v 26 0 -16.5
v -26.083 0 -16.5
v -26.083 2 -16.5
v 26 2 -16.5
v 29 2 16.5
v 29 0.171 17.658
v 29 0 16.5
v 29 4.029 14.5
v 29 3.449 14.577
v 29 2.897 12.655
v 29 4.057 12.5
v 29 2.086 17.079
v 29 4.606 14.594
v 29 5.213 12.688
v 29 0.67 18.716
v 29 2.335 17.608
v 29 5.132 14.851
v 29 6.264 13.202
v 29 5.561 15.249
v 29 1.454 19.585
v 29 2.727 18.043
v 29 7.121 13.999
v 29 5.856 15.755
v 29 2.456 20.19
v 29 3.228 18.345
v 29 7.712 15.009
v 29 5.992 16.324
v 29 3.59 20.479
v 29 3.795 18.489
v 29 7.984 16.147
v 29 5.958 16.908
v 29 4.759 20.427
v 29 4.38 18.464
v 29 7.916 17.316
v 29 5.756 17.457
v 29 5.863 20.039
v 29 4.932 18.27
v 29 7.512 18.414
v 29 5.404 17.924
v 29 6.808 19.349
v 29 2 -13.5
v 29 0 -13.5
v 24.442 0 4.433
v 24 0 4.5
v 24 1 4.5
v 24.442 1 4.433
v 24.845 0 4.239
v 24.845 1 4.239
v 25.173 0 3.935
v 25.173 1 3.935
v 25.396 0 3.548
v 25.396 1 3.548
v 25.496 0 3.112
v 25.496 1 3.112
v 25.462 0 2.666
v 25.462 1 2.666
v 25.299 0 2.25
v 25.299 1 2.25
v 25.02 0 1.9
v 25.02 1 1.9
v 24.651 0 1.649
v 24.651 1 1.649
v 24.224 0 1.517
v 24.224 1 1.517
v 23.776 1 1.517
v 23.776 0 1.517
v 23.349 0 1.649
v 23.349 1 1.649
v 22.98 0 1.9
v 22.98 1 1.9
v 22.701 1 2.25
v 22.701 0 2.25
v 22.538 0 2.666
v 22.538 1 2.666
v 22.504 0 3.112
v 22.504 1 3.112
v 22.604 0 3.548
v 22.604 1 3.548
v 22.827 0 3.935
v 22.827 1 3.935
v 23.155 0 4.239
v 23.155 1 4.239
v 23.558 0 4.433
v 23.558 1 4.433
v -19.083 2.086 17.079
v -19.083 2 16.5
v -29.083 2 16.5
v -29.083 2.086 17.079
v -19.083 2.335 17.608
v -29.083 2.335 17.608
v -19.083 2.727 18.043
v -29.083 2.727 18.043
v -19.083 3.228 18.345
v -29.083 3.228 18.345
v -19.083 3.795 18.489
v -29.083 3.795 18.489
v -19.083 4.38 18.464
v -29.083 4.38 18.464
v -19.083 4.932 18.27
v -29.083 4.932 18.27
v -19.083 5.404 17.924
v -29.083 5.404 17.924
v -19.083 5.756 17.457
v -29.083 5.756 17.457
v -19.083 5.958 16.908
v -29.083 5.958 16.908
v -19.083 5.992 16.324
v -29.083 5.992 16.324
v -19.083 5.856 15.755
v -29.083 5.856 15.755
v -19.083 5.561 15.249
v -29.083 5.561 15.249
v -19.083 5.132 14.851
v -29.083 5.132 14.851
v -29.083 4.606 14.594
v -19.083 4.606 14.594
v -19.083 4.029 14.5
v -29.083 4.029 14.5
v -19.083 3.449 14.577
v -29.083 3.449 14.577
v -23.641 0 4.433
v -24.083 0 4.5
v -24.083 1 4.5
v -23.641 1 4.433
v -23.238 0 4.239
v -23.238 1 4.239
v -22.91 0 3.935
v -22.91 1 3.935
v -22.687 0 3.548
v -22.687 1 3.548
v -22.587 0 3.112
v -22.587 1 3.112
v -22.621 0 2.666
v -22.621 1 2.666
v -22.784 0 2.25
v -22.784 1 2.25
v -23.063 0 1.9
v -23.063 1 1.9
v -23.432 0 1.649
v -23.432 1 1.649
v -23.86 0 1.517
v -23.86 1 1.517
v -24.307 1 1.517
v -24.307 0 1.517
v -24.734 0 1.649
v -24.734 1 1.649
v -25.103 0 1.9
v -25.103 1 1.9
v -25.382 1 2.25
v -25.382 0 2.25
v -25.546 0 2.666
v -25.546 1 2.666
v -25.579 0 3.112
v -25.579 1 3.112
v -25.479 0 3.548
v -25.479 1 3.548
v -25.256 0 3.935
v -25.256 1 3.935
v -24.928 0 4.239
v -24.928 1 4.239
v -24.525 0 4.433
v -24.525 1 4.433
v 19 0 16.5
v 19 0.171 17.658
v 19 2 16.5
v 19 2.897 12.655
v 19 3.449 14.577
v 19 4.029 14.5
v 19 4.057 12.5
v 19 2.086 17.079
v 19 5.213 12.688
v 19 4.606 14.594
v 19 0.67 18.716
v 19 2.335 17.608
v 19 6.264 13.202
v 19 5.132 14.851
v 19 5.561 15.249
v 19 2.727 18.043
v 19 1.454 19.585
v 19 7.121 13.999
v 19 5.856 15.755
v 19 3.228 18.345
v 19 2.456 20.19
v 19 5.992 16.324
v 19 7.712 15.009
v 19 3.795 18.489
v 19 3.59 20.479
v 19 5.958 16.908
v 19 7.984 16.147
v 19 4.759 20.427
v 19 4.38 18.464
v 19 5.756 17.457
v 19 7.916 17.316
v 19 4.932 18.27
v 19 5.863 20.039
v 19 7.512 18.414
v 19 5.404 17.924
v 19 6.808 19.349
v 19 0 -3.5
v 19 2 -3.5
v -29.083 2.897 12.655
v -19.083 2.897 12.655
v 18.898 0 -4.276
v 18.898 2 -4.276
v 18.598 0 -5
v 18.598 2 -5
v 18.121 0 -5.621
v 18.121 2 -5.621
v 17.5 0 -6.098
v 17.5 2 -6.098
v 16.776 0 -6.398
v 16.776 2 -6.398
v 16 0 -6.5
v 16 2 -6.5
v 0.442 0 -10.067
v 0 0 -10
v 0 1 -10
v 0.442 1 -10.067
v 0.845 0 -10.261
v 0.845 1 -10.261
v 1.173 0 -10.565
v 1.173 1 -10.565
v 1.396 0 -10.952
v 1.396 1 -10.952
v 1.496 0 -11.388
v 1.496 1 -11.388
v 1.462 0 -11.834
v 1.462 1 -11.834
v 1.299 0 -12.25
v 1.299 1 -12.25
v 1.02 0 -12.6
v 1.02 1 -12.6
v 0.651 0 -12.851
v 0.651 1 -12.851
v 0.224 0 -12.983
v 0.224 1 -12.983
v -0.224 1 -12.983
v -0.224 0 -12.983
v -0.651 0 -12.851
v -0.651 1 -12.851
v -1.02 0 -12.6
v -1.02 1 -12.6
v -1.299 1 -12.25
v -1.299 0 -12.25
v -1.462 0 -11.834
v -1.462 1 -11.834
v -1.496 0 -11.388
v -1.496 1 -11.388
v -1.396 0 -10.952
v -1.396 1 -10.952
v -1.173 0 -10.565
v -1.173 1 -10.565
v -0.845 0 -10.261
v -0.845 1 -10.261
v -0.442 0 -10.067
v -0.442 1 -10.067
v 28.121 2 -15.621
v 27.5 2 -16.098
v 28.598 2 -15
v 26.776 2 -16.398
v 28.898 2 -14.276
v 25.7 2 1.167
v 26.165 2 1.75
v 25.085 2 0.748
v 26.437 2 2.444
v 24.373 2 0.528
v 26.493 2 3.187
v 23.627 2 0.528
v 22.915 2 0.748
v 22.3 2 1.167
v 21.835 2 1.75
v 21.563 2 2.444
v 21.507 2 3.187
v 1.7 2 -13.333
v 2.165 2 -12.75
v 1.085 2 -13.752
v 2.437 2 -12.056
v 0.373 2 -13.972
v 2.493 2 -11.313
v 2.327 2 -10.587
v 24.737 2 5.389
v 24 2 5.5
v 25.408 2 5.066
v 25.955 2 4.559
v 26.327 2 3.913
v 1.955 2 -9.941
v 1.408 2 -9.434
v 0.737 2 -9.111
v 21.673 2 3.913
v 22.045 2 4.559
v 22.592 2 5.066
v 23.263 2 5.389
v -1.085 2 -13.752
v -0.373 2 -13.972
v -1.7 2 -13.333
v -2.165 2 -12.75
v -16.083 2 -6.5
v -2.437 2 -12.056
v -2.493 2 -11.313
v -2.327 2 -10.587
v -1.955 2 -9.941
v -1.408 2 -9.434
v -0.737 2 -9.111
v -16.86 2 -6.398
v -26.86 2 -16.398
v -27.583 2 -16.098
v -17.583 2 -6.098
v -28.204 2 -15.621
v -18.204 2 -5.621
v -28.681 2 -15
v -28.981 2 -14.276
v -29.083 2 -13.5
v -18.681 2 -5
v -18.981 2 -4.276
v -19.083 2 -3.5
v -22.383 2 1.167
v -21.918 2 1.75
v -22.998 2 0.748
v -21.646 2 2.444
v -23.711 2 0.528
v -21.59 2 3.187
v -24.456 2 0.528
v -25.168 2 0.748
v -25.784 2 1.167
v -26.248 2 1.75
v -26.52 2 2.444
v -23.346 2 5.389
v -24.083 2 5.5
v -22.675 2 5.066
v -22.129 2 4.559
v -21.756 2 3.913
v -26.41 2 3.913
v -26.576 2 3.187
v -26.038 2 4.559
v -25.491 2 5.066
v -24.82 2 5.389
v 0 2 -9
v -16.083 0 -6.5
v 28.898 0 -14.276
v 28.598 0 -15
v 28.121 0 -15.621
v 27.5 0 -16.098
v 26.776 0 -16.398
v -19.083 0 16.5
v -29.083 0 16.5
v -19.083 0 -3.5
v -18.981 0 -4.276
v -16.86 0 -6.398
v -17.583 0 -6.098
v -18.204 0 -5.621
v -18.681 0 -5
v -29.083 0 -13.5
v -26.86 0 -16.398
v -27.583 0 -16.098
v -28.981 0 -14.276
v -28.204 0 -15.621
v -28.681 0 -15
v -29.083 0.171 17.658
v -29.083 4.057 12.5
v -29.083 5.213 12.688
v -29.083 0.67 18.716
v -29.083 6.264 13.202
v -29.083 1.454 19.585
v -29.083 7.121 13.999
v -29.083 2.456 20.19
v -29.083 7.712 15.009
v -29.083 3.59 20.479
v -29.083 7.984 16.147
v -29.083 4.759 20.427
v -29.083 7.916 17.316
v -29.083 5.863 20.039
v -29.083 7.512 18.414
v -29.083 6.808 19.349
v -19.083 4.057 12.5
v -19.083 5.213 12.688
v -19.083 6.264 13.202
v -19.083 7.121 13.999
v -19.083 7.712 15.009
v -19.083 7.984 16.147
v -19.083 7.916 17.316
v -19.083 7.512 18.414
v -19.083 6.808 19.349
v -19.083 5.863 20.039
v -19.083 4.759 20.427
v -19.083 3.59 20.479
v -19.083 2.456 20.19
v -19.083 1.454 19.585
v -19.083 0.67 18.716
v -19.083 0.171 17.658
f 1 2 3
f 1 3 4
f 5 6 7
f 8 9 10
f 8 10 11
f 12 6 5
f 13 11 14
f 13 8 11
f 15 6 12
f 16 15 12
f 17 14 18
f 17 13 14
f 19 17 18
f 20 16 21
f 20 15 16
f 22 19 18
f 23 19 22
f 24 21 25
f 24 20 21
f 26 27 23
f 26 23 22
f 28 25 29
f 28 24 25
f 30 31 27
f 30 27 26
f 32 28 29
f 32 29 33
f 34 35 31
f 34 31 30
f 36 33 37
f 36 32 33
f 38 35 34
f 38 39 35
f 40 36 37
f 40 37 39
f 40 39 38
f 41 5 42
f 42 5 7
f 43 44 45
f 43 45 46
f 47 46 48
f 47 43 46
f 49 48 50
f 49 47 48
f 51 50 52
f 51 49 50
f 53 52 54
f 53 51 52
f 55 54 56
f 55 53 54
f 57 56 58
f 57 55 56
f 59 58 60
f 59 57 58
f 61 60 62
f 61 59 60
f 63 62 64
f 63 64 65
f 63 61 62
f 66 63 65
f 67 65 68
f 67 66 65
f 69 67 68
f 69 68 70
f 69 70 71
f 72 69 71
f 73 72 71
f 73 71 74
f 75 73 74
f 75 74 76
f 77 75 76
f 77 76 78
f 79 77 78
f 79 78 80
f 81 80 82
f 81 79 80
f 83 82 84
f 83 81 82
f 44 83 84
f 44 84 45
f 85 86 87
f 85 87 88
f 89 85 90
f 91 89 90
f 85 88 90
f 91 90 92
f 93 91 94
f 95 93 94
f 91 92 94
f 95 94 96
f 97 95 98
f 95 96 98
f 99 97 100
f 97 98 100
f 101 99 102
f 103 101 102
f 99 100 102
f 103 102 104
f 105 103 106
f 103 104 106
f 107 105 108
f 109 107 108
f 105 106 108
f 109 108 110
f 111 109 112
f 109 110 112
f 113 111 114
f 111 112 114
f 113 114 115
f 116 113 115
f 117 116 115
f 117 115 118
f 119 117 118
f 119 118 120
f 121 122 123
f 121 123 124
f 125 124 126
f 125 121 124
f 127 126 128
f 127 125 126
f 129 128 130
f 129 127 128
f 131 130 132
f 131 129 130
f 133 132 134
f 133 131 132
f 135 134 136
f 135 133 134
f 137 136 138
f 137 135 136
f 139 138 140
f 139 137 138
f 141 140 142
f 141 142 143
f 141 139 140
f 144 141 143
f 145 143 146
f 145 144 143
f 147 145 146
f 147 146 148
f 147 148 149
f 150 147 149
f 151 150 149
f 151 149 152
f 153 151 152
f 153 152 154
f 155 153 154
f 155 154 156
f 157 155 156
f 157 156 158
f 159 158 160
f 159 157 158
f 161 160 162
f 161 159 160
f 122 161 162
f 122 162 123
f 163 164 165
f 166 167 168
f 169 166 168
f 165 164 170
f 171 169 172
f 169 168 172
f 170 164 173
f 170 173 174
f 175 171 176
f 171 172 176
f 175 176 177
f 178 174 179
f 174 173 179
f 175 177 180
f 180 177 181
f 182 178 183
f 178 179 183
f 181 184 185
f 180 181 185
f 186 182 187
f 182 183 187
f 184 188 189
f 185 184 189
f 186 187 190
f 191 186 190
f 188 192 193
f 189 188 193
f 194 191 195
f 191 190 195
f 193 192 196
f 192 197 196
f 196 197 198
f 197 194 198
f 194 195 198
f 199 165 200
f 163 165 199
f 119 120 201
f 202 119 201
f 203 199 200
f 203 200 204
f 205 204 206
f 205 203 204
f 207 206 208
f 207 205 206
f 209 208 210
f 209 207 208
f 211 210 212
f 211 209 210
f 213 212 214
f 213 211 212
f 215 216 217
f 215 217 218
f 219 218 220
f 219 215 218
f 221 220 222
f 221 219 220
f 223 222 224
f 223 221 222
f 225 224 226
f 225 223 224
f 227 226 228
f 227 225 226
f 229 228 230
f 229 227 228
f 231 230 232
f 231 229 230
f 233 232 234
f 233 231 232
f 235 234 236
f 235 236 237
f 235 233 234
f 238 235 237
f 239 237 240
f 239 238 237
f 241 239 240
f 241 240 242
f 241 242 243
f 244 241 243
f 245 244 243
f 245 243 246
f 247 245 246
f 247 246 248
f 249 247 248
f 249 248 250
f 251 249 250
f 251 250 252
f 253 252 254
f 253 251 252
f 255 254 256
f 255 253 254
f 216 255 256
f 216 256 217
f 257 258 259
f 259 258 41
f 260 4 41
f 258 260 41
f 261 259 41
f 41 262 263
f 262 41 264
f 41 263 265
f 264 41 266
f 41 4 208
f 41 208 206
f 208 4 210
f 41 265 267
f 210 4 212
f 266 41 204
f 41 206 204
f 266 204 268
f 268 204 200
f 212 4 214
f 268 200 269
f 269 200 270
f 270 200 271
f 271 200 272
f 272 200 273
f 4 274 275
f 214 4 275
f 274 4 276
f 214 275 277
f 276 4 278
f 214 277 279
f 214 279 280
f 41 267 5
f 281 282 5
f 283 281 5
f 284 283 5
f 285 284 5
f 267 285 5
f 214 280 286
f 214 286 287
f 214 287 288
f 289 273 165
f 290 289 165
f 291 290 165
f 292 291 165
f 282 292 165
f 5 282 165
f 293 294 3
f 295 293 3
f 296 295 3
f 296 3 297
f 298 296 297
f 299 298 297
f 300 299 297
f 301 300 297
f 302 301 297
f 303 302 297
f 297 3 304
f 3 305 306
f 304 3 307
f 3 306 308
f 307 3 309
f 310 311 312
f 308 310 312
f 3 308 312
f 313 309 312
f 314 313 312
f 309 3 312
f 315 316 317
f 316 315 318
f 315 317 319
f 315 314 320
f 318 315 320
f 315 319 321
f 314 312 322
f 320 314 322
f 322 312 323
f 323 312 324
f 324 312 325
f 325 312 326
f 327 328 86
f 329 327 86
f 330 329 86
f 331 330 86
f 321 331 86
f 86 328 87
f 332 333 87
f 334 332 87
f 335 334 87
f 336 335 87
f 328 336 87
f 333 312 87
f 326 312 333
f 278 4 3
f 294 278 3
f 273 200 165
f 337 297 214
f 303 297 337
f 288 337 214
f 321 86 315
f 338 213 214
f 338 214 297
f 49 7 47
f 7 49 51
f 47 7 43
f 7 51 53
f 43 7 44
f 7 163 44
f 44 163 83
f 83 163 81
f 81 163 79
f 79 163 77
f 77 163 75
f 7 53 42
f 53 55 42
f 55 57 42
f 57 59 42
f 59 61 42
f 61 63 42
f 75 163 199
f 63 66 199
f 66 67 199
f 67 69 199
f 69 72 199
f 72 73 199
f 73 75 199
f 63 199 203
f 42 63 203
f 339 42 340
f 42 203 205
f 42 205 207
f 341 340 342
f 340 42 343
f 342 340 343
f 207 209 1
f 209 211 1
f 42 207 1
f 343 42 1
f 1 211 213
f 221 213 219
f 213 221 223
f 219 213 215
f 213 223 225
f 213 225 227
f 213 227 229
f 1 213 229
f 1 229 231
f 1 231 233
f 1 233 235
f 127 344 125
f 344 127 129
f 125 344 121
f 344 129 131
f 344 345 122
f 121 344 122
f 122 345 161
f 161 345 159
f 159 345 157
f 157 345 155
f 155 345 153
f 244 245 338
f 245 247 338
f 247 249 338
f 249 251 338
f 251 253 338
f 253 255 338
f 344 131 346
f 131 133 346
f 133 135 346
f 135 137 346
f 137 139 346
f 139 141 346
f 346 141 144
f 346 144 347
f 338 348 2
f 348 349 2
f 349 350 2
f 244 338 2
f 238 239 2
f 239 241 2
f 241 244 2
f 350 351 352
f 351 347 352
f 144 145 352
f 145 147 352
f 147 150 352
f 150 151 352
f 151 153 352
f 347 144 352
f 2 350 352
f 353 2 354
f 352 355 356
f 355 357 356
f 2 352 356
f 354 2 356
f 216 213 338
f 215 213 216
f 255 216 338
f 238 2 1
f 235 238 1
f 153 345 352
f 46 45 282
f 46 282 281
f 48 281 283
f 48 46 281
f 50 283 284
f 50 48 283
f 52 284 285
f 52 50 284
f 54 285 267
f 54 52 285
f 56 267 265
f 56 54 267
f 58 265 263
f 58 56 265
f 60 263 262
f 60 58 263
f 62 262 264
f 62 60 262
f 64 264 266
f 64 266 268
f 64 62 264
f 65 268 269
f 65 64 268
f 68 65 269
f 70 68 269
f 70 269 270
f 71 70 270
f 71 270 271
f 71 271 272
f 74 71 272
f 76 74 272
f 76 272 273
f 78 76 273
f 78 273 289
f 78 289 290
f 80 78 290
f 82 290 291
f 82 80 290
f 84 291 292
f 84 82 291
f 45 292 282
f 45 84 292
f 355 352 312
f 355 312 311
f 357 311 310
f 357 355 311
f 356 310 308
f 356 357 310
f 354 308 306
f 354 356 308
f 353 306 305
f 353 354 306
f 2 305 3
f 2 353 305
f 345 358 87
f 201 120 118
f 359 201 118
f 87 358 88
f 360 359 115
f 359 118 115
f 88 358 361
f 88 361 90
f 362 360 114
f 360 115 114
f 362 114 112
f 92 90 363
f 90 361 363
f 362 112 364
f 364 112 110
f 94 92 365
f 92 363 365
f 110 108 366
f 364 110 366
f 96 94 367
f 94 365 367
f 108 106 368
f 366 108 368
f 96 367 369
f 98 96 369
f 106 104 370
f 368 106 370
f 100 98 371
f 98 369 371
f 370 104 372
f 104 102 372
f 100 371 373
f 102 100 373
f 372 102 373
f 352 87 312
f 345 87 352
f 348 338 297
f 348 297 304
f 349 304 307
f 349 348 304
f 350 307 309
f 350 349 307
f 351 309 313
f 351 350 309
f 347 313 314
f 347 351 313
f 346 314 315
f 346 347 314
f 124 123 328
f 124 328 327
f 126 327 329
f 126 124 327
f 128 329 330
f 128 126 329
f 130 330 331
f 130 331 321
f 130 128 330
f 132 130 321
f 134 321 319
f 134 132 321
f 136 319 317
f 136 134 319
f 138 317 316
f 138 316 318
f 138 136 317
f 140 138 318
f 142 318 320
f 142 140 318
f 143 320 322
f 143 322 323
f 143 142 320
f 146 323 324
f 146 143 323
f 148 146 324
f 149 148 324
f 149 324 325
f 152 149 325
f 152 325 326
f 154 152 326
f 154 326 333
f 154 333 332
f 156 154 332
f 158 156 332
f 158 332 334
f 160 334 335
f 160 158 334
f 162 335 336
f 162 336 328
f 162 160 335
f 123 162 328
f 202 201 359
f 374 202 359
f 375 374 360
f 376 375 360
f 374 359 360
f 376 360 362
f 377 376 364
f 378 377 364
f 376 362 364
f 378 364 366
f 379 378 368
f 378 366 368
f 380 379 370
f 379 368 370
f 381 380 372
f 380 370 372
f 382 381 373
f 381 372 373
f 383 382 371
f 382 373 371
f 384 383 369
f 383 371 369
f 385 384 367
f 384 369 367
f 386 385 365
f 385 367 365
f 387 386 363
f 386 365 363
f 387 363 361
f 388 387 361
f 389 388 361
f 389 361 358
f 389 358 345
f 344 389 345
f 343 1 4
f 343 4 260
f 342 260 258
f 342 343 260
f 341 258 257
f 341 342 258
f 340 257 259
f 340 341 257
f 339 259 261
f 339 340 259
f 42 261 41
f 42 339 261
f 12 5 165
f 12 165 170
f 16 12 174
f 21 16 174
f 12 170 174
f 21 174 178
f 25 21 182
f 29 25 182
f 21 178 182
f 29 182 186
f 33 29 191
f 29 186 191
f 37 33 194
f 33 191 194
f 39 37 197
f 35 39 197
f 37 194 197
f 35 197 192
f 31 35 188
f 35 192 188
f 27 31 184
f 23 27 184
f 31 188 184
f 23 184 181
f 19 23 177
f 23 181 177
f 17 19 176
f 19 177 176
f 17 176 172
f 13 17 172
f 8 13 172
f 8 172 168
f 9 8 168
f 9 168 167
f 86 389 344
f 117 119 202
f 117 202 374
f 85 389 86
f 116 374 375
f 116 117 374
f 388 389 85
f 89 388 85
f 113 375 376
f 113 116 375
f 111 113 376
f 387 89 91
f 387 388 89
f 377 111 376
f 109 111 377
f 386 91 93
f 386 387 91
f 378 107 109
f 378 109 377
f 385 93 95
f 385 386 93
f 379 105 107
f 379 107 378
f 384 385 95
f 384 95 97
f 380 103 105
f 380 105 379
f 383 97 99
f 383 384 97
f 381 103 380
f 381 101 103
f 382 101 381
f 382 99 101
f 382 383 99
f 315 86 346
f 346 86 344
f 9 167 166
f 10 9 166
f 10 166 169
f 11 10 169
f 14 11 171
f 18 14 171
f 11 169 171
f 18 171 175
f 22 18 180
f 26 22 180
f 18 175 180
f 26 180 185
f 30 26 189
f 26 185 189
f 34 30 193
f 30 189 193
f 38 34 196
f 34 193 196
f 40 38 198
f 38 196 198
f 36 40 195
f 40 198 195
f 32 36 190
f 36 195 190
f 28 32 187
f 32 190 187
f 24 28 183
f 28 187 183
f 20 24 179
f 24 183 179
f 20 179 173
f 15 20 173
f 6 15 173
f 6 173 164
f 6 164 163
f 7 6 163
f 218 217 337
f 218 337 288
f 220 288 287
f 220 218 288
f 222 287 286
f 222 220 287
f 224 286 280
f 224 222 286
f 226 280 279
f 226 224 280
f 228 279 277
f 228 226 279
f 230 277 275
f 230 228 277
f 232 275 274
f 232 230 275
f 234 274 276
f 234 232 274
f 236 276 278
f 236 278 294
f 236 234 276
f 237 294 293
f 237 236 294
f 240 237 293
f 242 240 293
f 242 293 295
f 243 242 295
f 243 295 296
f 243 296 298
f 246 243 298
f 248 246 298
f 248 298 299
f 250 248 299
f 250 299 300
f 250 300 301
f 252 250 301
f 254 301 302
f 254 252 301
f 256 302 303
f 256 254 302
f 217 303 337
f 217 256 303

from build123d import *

# Parameters (mm, degrees)
IZIM1_R                     = 1.5
Y_KSEKLIK_EKSTR_ZYON1_DEPTH = 2
Y_KSEKLIK_EKSTR_ZYON2_START = -10
Y_KSEKLIK_EKSTR_ZYON2_DEPTH = 10
Y_KSEKLIK_EKSTR_ZYON3_START = -10
Y_KSEKLIK_EKSTR_ZYON3_DEPTH = 10
KAT_Y_D_N_T_R2_START        = 12.5
KAT_Y_D_N_T_R2_OUTLINE_W    = 10
KAT_Y_D_N_T_R2_OUTLINE_H    = 6
KAT_Y_D_N_T_R2_DEPTH        = 8
KAT_Y_D_N_T_R2_START_2      = 16.5
KAT_Y_D_N_T_R2_2_OUTLINE_W  = 10
KAT_Y_D_N_T_R2_2_OUTLINE_H  = 4
KAT_Y_D_N_T_R2_2_DEPTH      = 4
KENAR_START                 = -29.083147129
KENAR_EKME1_DEPTH           = 10
KENAR_START_2               = 19
KENAR_EKME1_2_DEPTH         = 10
PAH3_SIZE                   = 1


# Read off the part's stored shape, not the designer's step: Katıyı-Dönüştür2, Kenar Çekme1
with BuildPart() as part:
    # Çizim1 → Yükseklik-Ekstrüzyon1 (new body)
    with BuildSketch(Plane(origin=(0, 0, 0), x_dir=(1, 0, 0), z_dir=(0, 1, 0))):
        with BuildLine():
            Line((29, -12.5), (19, -12.5))
            Line((19, -12.5), (19, -6.464101615))
            Line((19, -6.464101615), (19, 3.5))
            ThreePointArc((19, 3.5), (18.121320344, 5.621320344), (16, 6.5))
            Line((16, 6.5), (-3.464101615, 6.5))
            Line((-3.464101615, 6.5), (-16.083147129, 6.5))
            ThreePointArc((-16.083147129, 6.5), (-18.204467472, 5.621320344), (-19.083147129, 3.5))
            Line((-19.083147129, 3.5), (-19.083147129, -6.464101615))
            Line((-19.083147129, -6.464101615), (-19.083147129, -12.5))
            Line((-19.083147129, -12.5), (-29.083147129, -12.5))
            Line((-29.083147129, -12.5), (-29.083147129, 13.5))
            ThreePointArc((-29.083147129, 13.5), (-28.204467472, 15.621320344), (-26.083147129, 16.5))
            Line((-26.083147129, 16.5), (26, 16.5))
            ThreePointArc((26, 16.5), (28.121320344, 15.621320344), (29, 13.5))
            Line((29, 13.5), (29, -12.5))
        make_face()
        with Locations(Location((-24.083147129, -3, 0), (0, 0, 270))):
            Circle(IZIM1_R, mode=Mode.SUBTRACT)
        with Locations(Location((0, 11.5, 0), (0, 0, 270))):
            Circle(IZIM1_R, mode=Mode.SUBTRACT)
        with Locations(Location((24, -3, 0), (0, 0, 270))):
            Circle(IZIM1_R, mode=Mode.SUBTRACT)
    extrude(amount=Y_KSEKLIK_EKSTR_ZYON1_DEPTH)

    # Çizim2 → Yükseklik-Ekstrüzyon2 (add)
    with BuildSketch(Plane(origin=(29, 0, 0), x_dir=(0, 0, -1), z_dir=(1, 0, 0)).offset(Y_KSEKLIK_EKSTR_ZYON2_START)):
        with BuildLine():
            Line((-14.767949192, 3), (-12.627016654, 3))
            ThreePointArc((-12.627016654, 3), (-18.949489743, 7.16227766), (-16.5, 0))
            Line((-16.5, 0), (-12.5, 0))
            Line((-12.5, 0), (-12.5, 2))
            Line((-12.5, 2), (-16.5, 2))
            ThreePointArc((-16.5, 2), (-17.5, 5.732050808), (-14.767949192, 3))
        make_face()
    extrude(amount=Y_KSEKLIK_EKSTR_ZYON2_DEPTH)

    # Çizim3 → Yükseklik-Ekstrüzyon3 (add)
    with BuildSketch(Plane(origin=(-19.083147129, 0, 0), x_dir=(0, 0, -1), z_dir=(1, 0, 0)).offset(Y_KSEKLIK_EKSTR_ZYON3_START)):
        with BuildLine():
            Line((-12.5, 2), (-16.5, 2))
            ThreePointArc((-16.5, 2), (-17.5, 5.732050808), (-14.767949192, 3))
            Line((-14.767949192, 3), (-12.627016654, 3))
            ThreePointArc((-12.627016654, 3), (-18.949489743, 7.16227766), (-16.5, 0))
            Line((-16.5, 0), (-12.5, 0))
            Line((-12.5, 0), (-12.5, 2))
        make_face()
    extrude(amount=Y_KSEKLIK_EKSTR_ZYON3_DEPTH)

    # Katıyı-Dönüştür2 outline → Katıyı-Dönüştür2 (cut)
    with BuildSketch(Plane.XY.offset(KAT_Y_D_N_T_R2_START)):
        with Locations((24, 6)):
            Rectangle(KAT_Y_D_N_T_R2_OUTLINE_W, KAT_Y_D_N_T_R2_OUTLINE_H)
        with Locations((-24.083147129, 6)):
            Rectangle(KAT_Y_D_N_T_R2_OUTLINE_W, KAT_Y_D_N_T_R2_OUTLINE_H)
    extrude(amount=KAT_Y_D_N_T_R2_DEPTH, mode=Mode.SUBTRACT)

    # Kat_y_-D_n_t_r2 2 outline → Kat_y_-D_n_t_r2 2 (cut)
    with BuildSketch(Plane.XY.offset(KAT_Y_D_N_T_R2_START_2)):
        with Locations((24, 1)):
            Rectangle(KAT_Y_D_N_T_R2_2_OUTLINE_W, KAT_Y_D_N_T_R2_2_OUTLINE_H)
        with Locations((-24.083147129, 1)):
            Rectangle(KAT_Y_D_N_T_R2_2_OUTLINE_W, KAT_Y_D_N_T_R2_2_OUTLINE_H)
    extrude(amount=KAT_Y_D_N_T_R2_2_DEPTH, mode=Mode.SUBTRACT)

    # Kenar Çekme1 outline → Kenar Çekme1 (add)
    with BuildSketch(Plane.YZ.offset(KENAR_START)):
        with BuildLine():
            Line((3.448725288, 14.577476608), (2.897450577, 12.654953216))
            ThreePointArc((2.897450577, 12.654953216), (7.19454204, 18.907260093), (0, 16.5))
            Line((0, 16.5), (2, 16.5))
            ThreePointArc((2, 16.5), (5.59727102, 17.703630046), (3.448725288, 14.577476608))
        make_face()
    extrude(amount=KENAR_EKME1_DEPTH)

    # Kenar _ekme1 2 outline → Kenar _ekme1 2 (add)
    with BuildSketch(Plane.YZ.offset(KENAR_START_2)):
        with BuildLine():
            Line((3.448725288, 14.577476608), (2.897450577, 12.654953216))
            ThreePointArc((2.897450577, 12.654953216), (7.19454204, 18.907260093), (0, 16.5))
            Line((0, 16.5), (2, 16.5))
            ThreePointArc((2, 16.5), (5.59727102, 17.703630046), (3.448725288, 14.577476608))
        make_face()
    extrude(amount=KENAR_EKME1_2_DEPTH)

    # Pah3
    pah3_edges = [part.edges().sort_by_distance(p)[0] for p in [
        (24, 2, 1.5),
        (-24.083147129, 2, 1.5),
        (0, 2, -13),
    ]]
    chamfer(pah3_edges, length=PAH3_SIZE)


solid = part.part
